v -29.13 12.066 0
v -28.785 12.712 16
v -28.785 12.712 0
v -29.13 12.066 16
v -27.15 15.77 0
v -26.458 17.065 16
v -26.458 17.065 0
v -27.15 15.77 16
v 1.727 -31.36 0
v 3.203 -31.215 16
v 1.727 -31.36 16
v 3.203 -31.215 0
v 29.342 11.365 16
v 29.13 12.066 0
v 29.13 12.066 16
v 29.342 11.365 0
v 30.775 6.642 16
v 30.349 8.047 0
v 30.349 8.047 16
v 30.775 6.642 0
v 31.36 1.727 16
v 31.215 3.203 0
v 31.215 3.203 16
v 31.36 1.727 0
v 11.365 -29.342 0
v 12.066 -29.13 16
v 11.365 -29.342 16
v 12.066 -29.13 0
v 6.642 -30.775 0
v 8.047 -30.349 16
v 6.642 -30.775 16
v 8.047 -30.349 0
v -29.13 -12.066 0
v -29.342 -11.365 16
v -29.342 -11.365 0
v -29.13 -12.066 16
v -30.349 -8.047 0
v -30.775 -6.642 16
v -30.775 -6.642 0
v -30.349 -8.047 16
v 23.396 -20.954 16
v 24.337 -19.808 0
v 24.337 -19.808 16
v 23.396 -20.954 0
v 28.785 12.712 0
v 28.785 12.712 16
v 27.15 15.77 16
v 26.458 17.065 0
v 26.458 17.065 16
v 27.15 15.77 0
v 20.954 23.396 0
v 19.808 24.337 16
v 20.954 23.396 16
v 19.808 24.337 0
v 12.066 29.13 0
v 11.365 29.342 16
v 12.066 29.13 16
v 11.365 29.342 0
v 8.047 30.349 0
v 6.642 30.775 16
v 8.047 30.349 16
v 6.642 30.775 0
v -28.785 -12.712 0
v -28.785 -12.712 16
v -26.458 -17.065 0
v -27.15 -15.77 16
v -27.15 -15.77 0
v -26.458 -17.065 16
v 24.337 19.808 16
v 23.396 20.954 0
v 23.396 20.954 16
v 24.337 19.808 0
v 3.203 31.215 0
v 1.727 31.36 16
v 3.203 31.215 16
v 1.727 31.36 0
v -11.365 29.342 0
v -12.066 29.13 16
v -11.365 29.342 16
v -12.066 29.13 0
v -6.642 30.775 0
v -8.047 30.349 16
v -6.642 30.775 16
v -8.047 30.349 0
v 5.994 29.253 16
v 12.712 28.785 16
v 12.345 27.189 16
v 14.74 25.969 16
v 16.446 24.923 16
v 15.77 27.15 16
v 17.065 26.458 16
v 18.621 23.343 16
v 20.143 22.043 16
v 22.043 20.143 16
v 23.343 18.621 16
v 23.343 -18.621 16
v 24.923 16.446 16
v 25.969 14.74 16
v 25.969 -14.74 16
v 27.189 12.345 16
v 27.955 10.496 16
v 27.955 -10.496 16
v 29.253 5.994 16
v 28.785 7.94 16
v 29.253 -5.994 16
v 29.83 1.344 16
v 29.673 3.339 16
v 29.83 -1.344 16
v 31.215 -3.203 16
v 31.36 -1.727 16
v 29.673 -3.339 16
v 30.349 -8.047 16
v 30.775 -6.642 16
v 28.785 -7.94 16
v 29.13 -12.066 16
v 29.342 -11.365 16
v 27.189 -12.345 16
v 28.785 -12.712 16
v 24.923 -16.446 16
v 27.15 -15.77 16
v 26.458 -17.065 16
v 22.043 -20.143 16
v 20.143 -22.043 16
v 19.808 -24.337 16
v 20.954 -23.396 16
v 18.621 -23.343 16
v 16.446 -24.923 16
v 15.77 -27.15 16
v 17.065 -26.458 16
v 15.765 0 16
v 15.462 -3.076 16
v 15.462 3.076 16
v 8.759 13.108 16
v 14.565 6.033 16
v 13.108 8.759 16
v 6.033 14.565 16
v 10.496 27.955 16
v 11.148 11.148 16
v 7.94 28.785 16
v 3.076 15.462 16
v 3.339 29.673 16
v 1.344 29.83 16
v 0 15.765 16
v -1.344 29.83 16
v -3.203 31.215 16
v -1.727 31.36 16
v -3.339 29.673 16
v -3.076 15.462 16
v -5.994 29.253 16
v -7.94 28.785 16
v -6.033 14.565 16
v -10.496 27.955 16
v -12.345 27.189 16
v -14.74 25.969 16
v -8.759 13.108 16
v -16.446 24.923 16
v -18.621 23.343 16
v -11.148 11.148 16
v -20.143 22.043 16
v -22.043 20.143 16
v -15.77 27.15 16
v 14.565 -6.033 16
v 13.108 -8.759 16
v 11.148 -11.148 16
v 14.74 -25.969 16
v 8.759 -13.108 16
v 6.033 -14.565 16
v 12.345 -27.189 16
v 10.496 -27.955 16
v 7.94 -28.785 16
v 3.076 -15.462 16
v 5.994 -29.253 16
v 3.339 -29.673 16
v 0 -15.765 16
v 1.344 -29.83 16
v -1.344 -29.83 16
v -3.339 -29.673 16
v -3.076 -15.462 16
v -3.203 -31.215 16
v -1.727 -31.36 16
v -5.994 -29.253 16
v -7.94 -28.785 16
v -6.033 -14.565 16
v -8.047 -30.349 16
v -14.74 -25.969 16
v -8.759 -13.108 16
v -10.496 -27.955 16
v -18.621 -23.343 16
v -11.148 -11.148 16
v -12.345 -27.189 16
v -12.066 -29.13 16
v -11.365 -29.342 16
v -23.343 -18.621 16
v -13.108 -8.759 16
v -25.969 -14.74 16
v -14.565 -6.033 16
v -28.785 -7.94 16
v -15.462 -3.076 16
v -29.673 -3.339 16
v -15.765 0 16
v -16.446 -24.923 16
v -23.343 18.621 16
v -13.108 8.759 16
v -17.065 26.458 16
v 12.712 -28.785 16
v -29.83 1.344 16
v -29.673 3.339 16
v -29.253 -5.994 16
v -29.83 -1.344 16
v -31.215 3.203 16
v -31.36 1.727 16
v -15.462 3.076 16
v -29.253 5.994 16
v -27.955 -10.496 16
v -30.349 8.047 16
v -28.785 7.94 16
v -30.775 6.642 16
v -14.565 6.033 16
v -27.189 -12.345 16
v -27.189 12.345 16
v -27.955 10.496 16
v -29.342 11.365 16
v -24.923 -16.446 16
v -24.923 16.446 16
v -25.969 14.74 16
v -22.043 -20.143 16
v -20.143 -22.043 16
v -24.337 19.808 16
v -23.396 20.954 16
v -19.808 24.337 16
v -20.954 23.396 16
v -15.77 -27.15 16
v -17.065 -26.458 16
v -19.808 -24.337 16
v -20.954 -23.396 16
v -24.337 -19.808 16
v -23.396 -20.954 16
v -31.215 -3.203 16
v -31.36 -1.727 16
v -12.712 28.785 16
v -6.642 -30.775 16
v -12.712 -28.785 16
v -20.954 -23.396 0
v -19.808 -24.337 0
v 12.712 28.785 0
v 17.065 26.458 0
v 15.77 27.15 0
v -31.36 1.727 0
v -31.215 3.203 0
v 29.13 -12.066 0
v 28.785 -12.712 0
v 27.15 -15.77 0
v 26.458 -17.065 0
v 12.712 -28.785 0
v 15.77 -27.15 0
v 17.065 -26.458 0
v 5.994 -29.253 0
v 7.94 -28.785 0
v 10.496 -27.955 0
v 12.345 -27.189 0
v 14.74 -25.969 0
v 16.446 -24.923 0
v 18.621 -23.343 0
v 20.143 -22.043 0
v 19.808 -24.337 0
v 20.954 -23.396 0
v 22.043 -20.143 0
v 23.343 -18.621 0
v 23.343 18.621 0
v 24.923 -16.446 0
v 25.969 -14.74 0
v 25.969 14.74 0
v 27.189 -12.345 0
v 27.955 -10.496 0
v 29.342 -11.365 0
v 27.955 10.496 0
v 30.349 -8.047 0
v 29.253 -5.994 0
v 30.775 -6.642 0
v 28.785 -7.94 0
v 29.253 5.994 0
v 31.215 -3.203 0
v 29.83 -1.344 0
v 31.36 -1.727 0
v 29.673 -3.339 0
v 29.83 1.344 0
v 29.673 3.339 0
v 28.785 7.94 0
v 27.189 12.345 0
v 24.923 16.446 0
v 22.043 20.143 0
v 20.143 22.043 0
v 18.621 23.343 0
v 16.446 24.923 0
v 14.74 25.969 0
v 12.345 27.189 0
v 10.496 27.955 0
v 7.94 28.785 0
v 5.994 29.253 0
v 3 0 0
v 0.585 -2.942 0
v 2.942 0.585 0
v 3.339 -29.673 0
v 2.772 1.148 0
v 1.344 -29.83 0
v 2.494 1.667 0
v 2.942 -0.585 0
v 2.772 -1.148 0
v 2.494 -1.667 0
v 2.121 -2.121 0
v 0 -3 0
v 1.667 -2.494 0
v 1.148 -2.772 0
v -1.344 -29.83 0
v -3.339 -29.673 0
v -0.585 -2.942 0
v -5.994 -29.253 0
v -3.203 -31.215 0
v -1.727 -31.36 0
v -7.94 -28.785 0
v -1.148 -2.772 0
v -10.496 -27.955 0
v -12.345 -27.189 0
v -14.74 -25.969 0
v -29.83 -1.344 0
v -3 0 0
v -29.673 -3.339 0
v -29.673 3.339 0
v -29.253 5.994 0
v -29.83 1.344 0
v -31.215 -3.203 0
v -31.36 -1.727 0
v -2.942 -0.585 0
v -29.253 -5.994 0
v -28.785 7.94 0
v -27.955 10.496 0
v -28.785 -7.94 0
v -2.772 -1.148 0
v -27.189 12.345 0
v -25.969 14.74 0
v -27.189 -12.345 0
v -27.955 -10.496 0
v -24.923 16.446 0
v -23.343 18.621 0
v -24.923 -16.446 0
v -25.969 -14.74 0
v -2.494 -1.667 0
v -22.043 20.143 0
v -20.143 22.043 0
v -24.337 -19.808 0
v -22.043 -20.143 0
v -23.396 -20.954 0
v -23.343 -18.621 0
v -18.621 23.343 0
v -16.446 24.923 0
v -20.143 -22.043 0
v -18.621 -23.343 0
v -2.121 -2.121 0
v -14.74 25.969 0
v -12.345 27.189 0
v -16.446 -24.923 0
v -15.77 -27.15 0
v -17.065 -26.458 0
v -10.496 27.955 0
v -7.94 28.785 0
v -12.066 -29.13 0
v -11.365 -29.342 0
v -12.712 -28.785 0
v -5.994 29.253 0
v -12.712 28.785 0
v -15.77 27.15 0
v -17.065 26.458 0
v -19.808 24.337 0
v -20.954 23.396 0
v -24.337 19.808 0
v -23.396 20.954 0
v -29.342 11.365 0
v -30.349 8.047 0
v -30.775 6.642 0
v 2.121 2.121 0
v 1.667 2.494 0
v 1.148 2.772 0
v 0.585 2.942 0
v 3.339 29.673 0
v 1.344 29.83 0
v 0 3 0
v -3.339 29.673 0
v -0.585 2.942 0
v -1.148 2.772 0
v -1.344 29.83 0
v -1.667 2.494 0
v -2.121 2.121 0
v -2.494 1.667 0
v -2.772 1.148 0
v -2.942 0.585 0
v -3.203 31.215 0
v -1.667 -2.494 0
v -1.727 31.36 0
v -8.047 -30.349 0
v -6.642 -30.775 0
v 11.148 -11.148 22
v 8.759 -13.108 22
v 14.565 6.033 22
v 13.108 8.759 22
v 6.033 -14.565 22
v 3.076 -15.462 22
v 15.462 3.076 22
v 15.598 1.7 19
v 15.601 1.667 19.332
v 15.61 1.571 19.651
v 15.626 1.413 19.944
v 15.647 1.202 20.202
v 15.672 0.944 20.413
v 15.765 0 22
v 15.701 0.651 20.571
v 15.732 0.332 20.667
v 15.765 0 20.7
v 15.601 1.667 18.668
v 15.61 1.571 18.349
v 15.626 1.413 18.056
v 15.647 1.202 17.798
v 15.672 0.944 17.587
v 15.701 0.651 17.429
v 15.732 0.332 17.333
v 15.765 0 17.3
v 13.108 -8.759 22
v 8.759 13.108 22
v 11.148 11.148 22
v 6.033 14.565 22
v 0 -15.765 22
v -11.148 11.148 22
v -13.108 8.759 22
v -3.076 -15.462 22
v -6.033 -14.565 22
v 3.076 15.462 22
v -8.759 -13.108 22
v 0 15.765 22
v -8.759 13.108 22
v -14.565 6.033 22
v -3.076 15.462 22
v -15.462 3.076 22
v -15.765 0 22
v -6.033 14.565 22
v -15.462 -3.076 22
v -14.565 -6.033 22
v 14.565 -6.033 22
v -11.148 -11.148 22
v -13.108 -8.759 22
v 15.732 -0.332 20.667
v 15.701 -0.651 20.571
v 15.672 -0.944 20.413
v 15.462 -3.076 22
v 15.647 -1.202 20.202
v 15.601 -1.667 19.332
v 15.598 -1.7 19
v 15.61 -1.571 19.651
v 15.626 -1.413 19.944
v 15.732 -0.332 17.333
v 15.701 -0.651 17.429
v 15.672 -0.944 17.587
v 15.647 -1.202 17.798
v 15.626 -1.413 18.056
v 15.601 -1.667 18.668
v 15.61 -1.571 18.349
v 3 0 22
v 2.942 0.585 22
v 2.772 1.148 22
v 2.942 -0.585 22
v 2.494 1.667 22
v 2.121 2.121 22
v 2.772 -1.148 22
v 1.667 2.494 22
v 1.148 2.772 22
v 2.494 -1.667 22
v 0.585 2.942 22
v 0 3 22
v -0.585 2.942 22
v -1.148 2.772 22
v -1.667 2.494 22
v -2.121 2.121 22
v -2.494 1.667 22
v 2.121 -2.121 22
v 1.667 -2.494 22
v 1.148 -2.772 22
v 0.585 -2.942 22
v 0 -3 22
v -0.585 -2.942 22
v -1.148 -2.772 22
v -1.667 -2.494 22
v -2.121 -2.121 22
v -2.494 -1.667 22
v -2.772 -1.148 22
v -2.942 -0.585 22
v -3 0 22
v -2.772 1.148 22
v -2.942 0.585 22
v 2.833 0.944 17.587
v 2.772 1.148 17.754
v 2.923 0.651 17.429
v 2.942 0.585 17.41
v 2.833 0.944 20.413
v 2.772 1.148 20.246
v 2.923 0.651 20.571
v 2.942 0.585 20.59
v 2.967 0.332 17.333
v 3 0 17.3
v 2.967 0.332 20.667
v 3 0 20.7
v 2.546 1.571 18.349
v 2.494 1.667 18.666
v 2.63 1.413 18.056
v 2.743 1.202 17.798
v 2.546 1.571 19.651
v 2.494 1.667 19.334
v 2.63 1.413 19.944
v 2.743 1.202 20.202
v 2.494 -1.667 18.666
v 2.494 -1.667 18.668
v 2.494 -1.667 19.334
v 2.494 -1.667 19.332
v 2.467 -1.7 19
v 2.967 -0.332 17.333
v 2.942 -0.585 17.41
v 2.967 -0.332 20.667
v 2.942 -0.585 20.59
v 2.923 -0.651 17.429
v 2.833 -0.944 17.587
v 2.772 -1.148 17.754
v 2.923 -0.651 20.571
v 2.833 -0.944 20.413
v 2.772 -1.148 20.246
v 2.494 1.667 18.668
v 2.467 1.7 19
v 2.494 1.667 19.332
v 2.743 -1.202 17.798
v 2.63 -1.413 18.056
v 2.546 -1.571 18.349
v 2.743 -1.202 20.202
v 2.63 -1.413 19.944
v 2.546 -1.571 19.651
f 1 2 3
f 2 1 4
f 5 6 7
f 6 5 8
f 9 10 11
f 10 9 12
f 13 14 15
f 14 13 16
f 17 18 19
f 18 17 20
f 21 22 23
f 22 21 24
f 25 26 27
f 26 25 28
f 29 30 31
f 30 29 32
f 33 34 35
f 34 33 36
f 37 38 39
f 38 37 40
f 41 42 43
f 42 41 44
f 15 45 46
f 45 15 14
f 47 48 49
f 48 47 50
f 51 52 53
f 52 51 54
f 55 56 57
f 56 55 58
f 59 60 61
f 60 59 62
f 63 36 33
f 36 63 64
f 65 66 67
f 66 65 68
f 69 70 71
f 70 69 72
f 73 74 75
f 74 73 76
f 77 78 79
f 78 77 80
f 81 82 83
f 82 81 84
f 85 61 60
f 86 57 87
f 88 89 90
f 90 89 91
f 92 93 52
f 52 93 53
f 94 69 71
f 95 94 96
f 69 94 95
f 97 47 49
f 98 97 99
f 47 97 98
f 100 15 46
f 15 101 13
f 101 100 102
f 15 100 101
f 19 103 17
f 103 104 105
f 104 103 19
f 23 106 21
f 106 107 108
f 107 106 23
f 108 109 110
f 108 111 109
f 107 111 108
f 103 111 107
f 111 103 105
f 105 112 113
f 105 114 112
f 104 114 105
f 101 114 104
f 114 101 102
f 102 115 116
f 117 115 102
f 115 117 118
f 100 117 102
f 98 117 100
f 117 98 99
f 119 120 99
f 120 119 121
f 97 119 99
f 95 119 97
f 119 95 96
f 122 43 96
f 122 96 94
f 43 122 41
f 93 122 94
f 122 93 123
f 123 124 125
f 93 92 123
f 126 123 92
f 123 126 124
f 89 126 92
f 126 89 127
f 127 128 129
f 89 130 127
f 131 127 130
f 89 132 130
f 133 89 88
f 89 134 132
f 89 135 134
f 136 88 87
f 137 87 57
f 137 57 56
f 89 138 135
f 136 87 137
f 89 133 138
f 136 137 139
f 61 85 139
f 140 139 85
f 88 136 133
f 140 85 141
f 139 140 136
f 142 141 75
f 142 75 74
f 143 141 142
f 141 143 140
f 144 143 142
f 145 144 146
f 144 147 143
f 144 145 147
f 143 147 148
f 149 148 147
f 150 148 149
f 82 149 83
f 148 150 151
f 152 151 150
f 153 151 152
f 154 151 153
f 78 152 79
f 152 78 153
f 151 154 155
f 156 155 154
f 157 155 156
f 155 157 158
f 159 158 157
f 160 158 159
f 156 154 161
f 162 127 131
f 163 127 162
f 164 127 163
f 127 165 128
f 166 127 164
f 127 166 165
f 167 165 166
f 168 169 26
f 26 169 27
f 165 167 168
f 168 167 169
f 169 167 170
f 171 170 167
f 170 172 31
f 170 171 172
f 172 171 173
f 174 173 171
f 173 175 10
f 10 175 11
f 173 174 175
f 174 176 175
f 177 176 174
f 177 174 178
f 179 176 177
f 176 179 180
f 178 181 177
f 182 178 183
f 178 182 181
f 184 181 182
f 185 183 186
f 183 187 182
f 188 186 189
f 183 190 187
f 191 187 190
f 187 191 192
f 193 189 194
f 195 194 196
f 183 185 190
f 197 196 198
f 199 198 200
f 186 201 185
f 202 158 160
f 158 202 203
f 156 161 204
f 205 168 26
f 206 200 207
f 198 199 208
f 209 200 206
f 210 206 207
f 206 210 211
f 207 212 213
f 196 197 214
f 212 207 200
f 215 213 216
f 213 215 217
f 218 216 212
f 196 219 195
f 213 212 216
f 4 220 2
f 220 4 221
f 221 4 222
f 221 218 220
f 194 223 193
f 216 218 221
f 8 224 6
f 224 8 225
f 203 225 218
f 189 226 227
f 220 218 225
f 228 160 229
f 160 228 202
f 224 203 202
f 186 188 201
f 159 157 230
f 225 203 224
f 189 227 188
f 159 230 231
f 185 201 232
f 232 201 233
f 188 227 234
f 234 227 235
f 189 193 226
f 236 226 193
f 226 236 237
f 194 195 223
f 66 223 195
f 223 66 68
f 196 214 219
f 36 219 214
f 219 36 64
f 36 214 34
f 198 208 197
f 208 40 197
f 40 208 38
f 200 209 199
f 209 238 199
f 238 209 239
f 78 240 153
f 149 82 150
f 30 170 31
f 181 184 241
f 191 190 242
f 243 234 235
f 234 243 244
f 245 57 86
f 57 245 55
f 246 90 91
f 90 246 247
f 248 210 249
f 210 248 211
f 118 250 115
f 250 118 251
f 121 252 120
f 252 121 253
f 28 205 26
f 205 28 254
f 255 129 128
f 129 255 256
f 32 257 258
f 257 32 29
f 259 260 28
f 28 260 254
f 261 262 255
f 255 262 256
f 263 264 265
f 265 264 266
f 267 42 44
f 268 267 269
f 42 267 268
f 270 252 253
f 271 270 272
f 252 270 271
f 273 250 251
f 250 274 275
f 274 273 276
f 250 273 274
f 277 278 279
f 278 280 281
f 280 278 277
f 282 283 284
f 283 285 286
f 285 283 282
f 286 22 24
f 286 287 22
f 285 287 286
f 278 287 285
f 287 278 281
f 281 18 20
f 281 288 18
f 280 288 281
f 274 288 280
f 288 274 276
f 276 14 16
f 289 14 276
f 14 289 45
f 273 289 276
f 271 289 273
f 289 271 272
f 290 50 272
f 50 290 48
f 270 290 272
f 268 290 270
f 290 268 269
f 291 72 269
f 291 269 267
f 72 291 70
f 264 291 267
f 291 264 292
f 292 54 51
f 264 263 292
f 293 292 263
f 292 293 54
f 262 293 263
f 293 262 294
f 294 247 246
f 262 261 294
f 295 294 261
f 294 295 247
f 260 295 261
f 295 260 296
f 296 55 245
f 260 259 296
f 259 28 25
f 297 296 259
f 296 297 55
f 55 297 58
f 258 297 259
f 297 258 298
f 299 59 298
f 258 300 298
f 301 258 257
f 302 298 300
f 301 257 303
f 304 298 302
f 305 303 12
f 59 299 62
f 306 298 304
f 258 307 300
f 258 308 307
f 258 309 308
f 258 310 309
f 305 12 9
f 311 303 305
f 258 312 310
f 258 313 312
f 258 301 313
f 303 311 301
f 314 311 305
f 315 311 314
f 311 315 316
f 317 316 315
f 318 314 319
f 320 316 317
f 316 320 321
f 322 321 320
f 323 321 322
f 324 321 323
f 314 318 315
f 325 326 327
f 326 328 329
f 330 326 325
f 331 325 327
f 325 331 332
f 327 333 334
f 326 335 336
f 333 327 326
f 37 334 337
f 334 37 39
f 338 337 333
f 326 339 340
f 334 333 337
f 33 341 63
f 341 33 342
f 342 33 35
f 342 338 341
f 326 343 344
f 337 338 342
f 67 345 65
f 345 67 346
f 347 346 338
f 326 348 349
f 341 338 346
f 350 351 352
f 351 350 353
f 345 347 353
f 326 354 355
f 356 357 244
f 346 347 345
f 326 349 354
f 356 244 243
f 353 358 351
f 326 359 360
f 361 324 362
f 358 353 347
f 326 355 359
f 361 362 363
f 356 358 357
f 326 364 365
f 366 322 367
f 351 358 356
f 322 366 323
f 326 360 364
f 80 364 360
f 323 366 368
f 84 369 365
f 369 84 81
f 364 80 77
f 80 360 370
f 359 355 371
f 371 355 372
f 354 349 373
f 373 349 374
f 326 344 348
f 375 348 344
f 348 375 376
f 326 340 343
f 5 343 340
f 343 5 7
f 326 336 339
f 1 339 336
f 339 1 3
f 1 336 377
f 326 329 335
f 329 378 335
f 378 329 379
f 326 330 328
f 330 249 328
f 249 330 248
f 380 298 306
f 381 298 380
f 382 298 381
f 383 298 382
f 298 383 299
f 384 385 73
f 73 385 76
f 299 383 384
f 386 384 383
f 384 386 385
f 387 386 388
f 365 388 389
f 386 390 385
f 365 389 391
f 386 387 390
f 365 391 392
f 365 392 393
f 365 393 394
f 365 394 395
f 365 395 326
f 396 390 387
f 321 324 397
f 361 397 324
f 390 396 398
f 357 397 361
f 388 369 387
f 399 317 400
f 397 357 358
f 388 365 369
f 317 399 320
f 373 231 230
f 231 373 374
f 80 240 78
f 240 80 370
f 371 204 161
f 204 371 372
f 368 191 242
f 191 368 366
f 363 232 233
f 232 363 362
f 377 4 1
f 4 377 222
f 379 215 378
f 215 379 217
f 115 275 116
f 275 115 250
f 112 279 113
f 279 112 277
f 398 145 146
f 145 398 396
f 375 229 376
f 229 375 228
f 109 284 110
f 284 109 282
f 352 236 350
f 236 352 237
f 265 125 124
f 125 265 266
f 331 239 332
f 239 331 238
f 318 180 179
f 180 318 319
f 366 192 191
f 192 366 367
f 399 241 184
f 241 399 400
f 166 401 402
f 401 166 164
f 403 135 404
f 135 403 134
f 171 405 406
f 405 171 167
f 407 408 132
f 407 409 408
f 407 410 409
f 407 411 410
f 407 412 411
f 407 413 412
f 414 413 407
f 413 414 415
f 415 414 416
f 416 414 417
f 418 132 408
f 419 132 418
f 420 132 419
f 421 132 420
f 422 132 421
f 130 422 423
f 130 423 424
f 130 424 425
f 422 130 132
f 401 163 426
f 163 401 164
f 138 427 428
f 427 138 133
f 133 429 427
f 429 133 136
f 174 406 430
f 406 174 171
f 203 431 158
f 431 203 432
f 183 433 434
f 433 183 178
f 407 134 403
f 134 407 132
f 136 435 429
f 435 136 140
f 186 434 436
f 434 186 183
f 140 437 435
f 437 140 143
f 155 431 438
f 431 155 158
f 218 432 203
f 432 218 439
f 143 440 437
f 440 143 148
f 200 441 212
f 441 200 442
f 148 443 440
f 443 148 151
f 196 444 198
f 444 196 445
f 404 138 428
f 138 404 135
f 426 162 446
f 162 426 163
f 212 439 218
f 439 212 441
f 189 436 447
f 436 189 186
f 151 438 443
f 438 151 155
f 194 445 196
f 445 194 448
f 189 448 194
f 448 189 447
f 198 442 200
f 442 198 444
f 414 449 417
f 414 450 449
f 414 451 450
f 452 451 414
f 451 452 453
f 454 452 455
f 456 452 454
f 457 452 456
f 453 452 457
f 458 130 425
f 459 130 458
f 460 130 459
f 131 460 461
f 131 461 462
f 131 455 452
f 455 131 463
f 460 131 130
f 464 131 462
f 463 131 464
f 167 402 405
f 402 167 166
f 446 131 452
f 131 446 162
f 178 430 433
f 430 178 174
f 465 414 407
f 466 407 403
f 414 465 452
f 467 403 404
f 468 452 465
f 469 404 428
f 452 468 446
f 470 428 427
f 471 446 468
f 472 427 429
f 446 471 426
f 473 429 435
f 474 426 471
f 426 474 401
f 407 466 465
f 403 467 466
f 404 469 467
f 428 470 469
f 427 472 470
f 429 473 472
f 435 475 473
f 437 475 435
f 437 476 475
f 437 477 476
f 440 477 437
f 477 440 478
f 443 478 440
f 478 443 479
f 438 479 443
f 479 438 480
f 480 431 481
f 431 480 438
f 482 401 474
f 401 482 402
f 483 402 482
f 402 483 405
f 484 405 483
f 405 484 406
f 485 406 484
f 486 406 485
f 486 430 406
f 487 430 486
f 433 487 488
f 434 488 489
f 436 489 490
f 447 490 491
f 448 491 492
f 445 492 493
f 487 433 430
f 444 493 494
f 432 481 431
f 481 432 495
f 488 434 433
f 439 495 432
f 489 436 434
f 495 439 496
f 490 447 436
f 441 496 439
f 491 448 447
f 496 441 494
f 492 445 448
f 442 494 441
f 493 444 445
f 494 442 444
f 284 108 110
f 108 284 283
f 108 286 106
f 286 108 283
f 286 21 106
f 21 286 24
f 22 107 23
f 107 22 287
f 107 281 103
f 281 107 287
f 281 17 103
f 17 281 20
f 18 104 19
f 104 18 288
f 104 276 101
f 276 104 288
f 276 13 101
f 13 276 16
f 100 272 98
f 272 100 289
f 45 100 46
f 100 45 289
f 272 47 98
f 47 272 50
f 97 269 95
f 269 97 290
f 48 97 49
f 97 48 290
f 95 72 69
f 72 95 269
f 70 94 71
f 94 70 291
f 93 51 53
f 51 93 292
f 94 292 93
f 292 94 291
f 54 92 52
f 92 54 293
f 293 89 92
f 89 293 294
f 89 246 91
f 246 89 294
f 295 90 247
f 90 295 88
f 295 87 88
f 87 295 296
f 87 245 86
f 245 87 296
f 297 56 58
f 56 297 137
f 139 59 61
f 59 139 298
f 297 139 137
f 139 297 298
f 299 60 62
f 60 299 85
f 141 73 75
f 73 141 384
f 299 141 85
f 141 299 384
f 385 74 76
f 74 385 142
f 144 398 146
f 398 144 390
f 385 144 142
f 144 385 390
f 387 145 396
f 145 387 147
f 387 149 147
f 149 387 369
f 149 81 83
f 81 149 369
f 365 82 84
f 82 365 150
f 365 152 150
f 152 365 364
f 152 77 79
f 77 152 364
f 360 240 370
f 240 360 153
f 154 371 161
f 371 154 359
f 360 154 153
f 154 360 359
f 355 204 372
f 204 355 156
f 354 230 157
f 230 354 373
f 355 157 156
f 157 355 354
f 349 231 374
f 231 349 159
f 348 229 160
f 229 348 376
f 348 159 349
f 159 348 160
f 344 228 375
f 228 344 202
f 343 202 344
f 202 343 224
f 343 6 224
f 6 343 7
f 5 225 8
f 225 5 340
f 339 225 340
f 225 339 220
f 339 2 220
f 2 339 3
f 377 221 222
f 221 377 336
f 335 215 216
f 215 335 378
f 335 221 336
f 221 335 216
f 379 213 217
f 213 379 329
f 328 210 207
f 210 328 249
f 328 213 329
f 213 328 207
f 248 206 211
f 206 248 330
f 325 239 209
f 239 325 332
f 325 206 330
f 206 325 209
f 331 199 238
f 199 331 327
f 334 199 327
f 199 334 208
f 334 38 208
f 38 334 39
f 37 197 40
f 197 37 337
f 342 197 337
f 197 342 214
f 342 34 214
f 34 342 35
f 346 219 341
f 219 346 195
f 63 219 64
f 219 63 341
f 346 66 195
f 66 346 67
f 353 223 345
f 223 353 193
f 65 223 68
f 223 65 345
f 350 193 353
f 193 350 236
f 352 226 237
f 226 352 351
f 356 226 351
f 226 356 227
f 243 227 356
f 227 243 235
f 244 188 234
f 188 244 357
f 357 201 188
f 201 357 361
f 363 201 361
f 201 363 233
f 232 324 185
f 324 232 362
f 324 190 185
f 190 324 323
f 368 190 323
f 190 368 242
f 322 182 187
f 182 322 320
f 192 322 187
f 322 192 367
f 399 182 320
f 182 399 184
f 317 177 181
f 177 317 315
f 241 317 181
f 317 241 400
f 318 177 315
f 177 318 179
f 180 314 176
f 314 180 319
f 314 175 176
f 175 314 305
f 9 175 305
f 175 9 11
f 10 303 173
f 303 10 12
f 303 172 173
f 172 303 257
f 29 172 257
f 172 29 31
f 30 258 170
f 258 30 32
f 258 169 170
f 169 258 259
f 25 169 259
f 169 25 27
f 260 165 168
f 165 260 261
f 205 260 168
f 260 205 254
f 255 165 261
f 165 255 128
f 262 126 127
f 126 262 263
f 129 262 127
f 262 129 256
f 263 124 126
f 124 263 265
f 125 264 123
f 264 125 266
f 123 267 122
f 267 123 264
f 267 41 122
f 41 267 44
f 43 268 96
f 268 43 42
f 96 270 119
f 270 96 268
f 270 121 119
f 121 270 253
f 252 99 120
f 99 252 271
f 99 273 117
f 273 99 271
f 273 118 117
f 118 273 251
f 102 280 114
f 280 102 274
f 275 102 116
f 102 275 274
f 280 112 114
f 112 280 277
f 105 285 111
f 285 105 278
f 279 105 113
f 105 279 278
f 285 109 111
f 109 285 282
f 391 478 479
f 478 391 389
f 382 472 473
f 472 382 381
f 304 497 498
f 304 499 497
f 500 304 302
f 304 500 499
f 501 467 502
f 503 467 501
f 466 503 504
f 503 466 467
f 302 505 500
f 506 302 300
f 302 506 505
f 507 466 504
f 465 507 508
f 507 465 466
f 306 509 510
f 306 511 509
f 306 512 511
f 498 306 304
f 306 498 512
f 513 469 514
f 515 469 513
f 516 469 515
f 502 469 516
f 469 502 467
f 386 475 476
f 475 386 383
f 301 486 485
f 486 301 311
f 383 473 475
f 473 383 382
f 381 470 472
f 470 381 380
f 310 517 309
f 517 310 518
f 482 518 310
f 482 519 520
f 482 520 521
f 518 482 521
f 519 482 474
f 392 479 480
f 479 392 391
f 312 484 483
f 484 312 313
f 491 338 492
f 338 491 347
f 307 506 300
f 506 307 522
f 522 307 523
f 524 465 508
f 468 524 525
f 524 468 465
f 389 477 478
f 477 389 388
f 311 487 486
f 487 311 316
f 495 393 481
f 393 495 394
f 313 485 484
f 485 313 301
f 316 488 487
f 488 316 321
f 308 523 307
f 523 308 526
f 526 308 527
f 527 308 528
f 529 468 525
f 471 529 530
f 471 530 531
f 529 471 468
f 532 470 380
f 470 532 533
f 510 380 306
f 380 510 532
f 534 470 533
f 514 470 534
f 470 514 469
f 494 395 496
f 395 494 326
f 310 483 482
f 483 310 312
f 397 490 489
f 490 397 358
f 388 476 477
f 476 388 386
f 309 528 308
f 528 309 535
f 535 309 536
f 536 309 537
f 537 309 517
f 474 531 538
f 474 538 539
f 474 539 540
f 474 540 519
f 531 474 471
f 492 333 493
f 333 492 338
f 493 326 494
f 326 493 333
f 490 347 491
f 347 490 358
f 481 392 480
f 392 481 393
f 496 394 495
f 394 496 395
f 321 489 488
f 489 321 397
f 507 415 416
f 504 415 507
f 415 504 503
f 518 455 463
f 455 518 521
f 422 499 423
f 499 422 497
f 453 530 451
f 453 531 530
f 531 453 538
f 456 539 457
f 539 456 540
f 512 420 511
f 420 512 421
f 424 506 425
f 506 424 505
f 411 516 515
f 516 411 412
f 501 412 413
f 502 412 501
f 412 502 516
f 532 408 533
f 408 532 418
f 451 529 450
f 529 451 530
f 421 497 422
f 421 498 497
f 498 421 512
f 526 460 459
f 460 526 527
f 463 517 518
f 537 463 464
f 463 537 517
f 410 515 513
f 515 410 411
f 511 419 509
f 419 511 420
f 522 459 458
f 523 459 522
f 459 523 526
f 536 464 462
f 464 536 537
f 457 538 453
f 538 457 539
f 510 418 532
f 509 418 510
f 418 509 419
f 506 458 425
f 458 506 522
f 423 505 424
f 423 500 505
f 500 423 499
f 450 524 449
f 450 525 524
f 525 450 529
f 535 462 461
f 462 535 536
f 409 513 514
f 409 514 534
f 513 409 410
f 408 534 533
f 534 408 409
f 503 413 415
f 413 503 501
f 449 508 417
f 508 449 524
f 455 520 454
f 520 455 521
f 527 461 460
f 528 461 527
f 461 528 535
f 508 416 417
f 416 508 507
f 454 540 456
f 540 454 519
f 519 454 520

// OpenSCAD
$fn = 32;

// ----------------------------------------------------------------------
// Timing pulley: HTD5 40T, pitch 5 mm, 63.06 mm x 22 mm
// ----------------------------------------------------------------------

// --- parameters (mm) ---
pitch_mm = 5;             // belt pitch
tooth_count = 40;         // number of grooves
width = 16;               // belt width between the flanges
tip_d = 63.06;            // tip circle diameter
root_d = 60.86;           // groove bottom diameter
groove_h = 1.1;           // groove depth
tooth_w = 3.2;            // groove width at the tip circle
hub_bore = 6;             // shaft bore
hub_d = 31.53;            // hub diameter
hub_h = 6;                // hub above the flange
bottom_z = 0;             // lowest point of the pulley
top_z = 22;               // highest point of the pulley
set_d = 3.4;              // set screw tap hole

module rim() {
  cylinder(h = width, d = tip_d);
}

module groove_cutter() {
  /* belt tooth groove: deeper than wide, cut through the belt width */
  translate([root_d / 2, 0, 0])
    linear_extrude(height = width)
      polygon(points = [[-0.6, -tooth_w * 0.42], [groove_h + 0.6, -tooth_w * 0.6],
                        [groove_h + 0.6, tooth_w * 0.6], [-0.6, tooth_w * 0.42]]);
}

module hub() {
  translate([0, 0, bottom_z]) cylinder(h = top_z - bottom_z, d = hub_d);
}

difference() {
  union() {
    rim();
    hub();
  }
  for (i = [0 : tooth_count - 1]) rotate([0, 0, i * 360 / tooth_count]) groove_cutter();
  translate([0, 0, bottom_z - 1]) cylinder(h = top_z - bottom_z + 2, d = hub_bore);
  translate([-1, 0, top_z - hub_h * 0.5]) rotate([0, 90, 0]) cylinder(h = hub_d / 2 + 3, d = set_d);
}
